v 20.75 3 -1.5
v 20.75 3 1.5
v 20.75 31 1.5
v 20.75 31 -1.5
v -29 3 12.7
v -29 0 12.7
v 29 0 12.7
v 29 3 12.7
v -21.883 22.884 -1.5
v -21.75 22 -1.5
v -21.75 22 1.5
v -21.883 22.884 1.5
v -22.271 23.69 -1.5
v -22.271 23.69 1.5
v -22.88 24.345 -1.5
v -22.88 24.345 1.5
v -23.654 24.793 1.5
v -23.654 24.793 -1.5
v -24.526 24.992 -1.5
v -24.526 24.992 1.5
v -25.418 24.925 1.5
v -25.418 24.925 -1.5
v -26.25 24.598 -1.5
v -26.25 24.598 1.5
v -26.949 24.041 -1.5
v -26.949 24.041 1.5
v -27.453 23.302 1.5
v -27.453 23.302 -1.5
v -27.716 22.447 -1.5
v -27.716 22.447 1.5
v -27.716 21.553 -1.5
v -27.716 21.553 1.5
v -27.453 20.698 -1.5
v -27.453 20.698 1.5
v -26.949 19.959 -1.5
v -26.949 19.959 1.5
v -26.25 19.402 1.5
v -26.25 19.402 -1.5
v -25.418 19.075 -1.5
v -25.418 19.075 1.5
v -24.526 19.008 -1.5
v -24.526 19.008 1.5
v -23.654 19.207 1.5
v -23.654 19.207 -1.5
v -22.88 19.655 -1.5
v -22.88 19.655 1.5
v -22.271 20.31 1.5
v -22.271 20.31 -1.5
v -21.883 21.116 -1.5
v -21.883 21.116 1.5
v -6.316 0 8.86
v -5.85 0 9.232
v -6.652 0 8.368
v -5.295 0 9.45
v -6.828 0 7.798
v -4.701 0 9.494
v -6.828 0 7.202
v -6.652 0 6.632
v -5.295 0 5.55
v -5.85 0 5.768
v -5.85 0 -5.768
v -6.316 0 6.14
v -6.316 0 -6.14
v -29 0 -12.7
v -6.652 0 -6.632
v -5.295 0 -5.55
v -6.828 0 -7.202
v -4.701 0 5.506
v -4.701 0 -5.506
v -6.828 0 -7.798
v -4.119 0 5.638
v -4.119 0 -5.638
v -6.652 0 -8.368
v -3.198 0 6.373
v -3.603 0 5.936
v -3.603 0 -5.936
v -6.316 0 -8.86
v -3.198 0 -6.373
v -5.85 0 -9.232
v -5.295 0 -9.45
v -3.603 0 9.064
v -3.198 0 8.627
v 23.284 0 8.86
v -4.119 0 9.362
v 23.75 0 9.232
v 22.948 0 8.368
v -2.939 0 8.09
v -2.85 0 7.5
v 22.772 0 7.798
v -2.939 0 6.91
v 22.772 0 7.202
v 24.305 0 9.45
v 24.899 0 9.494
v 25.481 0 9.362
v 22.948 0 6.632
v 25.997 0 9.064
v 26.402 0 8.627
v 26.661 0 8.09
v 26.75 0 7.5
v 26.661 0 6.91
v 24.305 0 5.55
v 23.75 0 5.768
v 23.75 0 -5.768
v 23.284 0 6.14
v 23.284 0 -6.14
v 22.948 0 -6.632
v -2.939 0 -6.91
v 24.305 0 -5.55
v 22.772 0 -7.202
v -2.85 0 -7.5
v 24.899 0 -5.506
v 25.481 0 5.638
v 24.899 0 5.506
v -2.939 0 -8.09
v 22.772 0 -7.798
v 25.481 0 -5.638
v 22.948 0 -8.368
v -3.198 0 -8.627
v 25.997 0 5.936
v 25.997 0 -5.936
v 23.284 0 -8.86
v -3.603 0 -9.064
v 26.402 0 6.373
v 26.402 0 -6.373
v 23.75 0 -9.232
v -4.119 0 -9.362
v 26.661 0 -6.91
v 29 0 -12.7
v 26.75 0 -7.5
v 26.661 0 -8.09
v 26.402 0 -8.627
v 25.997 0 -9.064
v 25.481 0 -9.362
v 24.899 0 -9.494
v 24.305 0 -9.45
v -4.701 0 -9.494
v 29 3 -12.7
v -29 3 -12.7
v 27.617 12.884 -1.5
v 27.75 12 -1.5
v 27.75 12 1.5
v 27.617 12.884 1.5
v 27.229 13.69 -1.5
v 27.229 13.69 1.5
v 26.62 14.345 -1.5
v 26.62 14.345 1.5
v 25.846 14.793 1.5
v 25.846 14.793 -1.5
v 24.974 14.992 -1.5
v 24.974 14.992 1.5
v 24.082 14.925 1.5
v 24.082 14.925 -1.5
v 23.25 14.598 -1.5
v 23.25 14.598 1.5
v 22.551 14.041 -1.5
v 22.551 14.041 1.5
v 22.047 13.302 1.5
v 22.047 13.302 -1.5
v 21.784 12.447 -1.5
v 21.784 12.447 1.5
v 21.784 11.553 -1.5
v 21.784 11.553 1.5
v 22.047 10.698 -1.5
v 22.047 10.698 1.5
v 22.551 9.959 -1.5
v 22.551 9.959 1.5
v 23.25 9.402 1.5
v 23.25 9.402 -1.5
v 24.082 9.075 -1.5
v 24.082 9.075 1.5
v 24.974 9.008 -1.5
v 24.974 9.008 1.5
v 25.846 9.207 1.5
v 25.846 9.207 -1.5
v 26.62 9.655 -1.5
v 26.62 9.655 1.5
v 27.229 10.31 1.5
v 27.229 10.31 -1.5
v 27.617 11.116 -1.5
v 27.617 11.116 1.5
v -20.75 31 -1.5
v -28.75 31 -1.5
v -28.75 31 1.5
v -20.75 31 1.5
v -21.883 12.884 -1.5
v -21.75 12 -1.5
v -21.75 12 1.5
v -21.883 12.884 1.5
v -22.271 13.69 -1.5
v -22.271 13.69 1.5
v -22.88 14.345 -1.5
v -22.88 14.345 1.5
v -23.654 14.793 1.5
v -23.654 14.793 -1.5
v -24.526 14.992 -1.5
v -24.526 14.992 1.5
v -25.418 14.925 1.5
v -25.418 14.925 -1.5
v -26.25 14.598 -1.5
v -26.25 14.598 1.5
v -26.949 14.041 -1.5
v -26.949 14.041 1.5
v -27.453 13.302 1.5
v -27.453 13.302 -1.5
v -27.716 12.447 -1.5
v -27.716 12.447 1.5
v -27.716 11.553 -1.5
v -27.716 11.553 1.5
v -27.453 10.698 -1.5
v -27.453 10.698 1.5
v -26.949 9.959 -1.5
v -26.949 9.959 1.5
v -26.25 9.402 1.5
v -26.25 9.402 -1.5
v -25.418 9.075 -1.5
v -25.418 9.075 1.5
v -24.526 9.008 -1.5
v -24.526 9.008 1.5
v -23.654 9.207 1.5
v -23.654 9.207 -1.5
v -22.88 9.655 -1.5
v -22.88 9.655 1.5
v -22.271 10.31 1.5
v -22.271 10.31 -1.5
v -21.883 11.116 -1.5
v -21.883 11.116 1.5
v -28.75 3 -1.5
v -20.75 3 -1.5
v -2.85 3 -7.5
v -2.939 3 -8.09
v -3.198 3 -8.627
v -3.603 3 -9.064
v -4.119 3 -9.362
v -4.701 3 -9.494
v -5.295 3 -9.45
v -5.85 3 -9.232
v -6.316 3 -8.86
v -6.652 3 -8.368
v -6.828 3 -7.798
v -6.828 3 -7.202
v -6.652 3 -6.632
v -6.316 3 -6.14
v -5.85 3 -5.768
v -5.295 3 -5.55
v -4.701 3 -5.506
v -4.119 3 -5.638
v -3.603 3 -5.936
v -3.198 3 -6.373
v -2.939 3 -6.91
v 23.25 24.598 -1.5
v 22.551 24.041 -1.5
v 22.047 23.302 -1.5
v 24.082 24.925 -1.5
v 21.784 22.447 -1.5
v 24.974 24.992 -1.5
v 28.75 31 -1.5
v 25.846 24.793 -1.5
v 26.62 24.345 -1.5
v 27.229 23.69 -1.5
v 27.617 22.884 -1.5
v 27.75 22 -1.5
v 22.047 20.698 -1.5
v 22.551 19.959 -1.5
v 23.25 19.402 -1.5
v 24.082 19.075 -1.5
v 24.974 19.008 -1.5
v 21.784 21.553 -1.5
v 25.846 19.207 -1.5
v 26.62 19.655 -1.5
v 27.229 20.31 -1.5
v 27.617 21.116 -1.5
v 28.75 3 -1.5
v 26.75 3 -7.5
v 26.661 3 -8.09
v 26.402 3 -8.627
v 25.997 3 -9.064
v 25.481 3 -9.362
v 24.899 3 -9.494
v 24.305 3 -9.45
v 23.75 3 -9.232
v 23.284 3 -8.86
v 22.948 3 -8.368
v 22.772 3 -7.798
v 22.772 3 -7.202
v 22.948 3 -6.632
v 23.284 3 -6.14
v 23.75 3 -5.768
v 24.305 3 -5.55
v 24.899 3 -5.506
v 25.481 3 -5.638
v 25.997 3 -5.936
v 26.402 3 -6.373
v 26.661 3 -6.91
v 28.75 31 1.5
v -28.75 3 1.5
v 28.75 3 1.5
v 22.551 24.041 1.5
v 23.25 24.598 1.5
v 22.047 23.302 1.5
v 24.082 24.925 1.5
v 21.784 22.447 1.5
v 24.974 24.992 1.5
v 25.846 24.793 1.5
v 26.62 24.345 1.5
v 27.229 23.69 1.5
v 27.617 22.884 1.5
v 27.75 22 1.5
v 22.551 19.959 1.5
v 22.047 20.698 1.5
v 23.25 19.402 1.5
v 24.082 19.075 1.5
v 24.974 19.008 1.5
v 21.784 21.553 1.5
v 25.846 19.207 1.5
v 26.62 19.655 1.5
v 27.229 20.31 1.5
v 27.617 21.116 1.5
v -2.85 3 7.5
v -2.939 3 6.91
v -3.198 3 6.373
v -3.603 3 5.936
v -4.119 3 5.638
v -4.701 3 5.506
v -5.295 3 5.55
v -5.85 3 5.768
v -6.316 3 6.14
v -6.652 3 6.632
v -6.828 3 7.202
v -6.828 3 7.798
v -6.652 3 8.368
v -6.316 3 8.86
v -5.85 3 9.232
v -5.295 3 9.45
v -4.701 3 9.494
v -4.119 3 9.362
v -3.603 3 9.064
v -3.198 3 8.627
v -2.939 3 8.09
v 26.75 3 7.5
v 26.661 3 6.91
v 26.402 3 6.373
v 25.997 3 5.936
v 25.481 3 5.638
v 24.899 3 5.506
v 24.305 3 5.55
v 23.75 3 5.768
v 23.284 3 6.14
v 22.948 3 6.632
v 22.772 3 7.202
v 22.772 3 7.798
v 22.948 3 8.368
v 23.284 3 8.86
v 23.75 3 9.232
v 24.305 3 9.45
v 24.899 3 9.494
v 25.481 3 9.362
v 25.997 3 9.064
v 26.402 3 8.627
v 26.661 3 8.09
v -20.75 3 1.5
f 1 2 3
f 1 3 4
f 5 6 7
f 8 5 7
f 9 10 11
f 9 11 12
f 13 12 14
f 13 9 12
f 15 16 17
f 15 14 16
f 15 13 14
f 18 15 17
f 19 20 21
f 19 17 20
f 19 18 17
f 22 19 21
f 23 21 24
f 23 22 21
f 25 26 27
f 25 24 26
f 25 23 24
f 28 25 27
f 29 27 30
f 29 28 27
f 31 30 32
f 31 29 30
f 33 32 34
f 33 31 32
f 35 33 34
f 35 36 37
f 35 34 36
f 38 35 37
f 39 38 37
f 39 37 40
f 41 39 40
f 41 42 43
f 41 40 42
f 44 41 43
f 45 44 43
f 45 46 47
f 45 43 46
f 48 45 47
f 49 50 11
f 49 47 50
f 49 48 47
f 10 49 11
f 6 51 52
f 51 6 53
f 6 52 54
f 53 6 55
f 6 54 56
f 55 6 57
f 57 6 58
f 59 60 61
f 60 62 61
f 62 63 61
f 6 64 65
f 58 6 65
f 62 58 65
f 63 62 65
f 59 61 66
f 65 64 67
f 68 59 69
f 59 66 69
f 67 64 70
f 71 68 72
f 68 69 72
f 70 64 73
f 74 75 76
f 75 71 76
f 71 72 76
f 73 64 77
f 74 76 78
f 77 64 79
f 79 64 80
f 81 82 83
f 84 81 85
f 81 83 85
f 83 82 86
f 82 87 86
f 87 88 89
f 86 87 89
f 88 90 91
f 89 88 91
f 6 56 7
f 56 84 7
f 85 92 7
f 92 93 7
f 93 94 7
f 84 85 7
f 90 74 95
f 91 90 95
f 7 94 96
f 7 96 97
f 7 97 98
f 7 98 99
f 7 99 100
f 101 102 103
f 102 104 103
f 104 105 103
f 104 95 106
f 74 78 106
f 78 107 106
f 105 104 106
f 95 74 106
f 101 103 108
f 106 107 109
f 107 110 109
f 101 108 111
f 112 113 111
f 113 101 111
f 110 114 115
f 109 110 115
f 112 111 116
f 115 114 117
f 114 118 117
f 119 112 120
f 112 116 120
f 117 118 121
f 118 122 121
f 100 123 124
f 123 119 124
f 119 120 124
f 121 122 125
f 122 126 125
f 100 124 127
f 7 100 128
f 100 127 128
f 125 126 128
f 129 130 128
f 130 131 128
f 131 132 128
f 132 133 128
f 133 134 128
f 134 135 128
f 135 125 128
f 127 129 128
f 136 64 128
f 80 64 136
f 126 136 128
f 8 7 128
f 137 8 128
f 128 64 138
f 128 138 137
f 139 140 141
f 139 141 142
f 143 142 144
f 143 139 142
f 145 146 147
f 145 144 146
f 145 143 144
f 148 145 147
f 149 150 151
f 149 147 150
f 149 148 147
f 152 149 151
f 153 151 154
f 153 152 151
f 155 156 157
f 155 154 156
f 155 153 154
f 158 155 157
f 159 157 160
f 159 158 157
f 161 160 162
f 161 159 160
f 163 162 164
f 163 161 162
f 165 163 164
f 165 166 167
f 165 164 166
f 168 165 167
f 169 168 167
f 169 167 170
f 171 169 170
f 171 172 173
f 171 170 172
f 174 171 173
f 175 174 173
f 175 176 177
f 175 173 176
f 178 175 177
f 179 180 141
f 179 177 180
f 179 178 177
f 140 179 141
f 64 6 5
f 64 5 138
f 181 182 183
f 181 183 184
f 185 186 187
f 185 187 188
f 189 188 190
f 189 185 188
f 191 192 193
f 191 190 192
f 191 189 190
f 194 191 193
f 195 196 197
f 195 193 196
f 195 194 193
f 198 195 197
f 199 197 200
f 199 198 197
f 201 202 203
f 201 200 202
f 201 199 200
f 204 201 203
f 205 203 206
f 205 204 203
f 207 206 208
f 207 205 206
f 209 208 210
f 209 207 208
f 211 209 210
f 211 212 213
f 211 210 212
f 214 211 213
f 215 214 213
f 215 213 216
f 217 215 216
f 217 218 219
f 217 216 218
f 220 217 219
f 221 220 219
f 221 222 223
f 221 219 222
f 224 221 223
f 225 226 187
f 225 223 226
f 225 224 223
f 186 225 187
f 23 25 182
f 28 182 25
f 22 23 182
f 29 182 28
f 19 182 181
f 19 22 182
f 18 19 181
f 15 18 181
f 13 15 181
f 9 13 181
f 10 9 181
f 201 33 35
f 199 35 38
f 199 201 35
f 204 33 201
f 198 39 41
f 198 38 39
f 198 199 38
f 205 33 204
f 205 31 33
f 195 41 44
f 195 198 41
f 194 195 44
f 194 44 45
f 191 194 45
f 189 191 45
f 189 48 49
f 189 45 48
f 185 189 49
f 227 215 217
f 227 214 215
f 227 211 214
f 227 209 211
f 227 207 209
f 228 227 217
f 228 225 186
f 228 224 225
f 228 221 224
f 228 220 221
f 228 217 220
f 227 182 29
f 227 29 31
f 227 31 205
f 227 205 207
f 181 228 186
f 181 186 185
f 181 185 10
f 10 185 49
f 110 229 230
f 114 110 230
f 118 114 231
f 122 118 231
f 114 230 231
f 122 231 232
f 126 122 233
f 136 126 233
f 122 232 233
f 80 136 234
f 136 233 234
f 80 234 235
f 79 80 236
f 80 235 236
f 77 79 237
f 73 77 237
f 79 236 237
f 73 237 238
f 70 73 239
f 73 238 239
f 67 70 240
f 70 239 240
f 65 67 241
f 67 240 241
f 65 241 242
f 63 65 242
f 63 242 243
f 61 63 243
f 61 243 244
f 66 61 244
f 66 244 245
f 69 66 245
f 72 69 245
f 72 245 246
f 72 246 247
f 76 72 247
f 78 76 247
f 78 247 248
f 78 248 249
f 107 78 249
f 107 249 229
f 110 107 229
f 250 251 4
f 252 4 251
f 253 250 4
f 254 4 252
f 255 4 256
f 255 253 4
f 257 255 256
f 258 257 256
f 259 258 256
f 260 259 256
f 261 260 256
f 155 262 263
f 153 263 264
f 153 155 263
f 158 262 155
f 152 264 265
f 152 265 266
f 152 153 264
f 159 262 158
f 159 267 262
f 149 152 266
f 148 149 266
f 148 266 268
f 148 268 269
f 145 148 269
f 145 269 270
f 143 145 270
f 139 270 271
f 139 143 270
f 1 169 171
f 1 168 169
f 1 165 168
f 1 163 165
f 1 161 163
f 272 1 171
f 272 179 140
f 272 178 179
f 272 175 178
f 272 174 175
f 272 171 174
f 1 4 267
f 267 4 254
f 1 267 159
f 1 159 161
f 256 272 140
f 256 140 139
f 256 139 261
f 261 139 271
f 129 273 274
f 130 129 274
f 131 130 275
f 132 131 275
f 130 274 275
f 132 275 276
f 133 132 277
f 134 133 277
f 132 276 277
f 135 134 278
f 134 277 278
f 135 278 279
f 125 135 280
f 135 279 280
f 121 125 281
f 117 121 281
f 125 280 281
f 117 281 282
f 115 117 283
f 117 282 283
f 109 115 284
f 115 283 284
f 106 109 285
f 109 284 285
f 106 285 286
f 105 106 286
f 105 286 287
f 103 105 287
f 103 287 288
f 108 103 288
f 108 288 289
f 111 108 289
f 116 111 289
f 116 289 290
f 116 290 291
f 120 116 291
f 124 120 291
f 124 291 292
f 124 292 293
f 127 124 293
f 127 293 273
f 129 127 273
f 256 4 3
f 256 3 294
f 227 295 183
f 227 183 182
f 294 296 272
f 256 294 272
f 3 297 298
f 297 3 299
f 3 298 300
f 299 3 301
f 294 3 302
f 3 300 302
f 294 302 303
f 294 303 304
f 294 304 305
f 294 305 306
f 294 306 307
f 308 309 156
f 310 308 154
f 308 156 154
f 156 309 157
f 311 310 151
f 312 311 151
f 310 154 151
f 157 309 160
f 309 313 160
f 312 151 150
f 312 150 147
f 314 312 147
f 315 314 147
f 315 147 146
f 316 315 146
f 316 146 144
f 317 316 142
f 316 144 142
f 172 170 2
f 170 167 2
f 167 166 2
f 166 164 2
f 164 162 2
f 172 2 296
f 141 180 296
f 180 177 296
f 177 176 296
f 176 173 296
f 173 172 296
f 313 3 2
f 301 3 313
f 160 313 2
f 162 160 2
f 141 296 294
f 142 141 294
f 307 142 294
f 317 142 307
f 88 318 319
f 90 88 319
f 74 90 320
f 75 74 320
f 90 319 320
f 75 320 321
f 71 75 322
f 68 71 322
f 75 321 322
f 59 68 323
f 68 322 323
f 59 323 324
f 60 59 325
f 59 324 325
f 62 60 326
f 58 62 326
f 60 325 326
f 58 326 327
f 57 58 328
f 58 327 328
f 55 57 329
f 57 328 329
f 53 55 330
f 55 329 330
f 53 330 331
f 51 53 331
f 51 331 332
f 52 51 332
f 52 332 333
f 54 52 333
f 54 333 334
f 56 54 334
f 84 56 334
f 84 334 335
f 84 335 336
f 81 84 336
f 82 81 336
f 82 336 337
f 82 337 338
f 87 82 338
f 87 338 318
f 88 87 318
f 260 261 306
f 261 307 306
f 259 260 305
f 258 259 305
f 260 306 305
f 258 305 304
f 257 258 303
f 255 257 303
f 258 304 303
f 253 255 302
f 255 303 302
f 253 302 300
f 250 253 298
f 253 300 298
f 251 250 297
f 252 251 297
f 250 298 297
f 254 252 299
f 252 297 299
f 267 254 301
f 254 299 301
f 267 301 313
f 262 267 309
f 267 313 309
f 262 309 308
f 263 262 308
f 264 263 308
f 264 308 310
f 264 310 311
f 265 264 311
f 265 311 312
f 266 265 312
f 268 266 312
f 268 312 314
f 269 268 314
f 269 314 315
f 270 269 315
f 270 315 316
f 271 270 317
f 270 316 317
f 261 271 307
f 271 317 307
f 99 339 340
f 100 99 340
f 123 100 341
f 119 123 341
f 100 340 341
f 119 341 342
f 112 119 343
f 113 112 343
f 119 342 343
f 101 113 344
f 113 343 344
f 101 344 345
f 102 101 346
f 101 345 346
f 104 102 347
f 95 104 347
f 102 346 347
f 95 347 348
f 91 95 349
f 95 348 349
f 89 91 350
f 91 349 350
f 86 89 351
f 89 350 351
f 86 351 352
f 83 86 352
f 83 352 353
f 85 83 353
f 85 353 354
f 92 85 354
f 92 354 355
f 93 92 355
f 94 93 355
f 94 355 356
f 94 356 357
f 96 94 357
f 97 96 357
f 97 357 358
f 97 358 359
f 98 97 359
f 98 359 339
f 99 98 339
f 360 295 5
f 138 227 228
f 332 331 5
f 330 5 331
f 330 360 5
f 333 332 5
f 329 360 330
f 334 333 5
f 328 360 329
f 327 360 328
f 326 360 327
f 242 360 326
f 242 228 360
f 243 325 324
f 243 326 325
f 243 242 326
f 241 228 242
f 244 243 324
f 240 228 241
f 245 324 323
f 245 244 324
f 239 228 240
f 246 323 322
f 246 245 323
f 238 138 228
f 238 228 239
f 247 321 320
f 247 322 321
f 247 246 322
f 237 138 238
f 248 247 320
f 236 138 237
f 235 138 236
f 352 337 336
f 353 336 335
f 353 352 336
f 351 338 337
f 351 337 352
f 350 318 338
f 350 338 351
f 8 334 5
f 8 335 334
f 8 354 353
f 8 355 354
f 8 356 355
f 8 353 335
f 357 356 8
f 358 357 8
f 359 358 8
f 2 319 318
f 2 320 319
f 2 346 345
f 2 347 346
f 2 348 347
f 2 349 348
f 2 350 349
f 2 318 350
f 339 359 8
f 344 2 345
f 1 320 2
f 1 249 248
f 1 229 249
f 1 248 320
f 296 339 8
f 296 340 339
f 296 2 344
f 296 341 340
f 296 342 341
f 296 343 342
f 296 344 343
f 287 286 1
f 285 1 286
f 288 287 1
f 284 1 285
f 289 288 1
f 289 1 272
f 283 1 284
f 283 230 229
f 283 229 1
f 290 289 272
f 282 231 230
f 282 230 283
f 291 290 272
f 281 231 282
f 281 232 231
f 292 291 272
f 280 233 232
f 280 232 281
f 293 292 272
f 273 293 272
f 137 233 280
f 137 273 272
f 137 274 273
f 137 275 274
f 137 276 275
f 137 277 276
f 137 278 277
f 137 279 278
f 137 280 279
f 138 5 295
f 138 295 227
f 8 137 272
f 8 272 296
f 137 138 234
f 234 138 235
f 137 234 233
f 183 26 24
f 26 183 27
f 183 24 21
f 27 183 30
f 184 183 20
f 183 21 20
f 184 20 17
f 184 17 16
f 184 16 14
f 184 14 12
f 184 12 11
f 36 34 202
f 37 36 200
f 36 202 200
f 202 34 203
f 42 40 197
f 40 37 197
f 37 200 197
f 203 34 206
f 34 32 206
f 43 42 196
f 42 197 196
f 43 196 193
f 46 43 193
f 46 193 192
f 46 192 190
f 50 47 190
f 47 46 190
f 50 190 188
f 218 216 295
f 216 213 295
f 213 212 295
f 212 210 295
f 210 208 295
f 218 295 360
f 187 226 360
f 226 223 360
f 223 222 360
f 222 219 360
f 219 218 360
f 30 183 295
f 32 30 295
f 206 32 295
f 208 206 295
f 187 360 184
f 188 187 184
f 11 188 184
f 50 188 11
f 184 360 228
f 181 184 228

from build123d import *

# Parameters (mm, degrees)
SKETCH_1_W          = 58
SKETCH_1_H          = 25.4
EXTRUDE_1_DEPTH     = 3
SKETCH_2_W          = 8
SKETCH_2_H          = 3
EXTRUDE_2_DEPTH     = 28
SKETCH_3_R          = 3
CUT_EXTRUDE_1_DEPTH = 12
SKETCH_4_R          = 2
CUT_EXTRUDE_2_DEPTH = 22
SKETCH_8_W          = 8
SKETCH_8_H          = 3
CUT_EXTRUDE_3_DEPTH = 28


with BuildPart() as part:
    # 草图1 → 凸台-拉伸1 (new body)
    with BuildSketch(Plane(origin=(0, 0, 0), x_dir=(1, 0, 0), z_dir=(0, 1, 0))):
        Rectangle(SKETCH_1_W, SKETCH_1_H)
    extrude(amount=EXTRUDE_1_DEPTH)

    # 草图2 → 凸台-拉伸2 (add)
    with BuildSketch(Plane(origin=(0, 3, 0), x_dir=(1, 0, 0), z_dir=(0, 1, 0))):
        with Locations((-24.75, 11.2)):
            Rectangle(SKETCH_2_W, SKETCH_2_H)
        with Locations((24.75, 11.2)):
            Rectangle(SKETCH_2_W, SKETCH_2_H)
        with Locations((-24.75, 0)):
            Rectangle(SKETCH_2_W, SKETCH_2_H)
        with Locations((24.75, 0)):
            Rectangle(SKETCH_2_W, SKETCH_2_H)
    extrude(amount=EXTRUDE_2_DEPTH)

    # 草图3 → 切除-拉伸1 (cut, symmetric)
    with BuildSketch(Plane.XY.offset(-9.7)):
        with Locations((-24.75, 12)):
            Circle(SKETCH_3_R)
        with Locations((-24.75, 22)):
            Circle(SKETCH_3_R)
        with Locations((24.75, 12)):
            Circle(SKETCH_3_R)
        with Locations((24.75, 22)):
            Circle(SKETCH_3_R)
    extrude(amount=CUT_EXTRUDE_1_DEPTH, both=True, mode=Mode.SUBTRACT)

    # 草图4 → 切除-拉伸2 (cut)
    with BuildSketch(Plane(origin=(0, 3, 0), x_dir=(1, 0, 0), z_dir=(0, 1, 0))):
        with Locations((24.75, -7.5)):
            Circle(SKETCH_4_R)
        with Locations((24.75, 7.5)):
            Circle(SKETCH_4_R)
        with Locations((-4.85, 7.5)):
            Circle(SKETCH_4_R)
        with Locations((-4.85, -7.5)):
            Circle(SKETCH_4_R)
    extrude(amount=-CUT_EXTRUDE_2_DEPTH, mode=Mode.SUBTRACT)

    # 草图8 → 切除-拉伸3 (cut)
    with BuildSketch(Plane(origin=(0, 31, 0), x_dir=(1, 0, 0), z_dir=(0, 1, 0))):
        with Locations((-24.75, 11.2)):
            Rectangle(SKETCH_8_W, SKETCH_8_H)
        with Locations((24.75, 11.2)):
            Rectangle(SKETCH_8_W, SKETCH_8_H)
    extrude(amount=-CUT_EXTRUDE_3_DEPTH, mode=Mode.SUBTRACT)


solid = part.part
